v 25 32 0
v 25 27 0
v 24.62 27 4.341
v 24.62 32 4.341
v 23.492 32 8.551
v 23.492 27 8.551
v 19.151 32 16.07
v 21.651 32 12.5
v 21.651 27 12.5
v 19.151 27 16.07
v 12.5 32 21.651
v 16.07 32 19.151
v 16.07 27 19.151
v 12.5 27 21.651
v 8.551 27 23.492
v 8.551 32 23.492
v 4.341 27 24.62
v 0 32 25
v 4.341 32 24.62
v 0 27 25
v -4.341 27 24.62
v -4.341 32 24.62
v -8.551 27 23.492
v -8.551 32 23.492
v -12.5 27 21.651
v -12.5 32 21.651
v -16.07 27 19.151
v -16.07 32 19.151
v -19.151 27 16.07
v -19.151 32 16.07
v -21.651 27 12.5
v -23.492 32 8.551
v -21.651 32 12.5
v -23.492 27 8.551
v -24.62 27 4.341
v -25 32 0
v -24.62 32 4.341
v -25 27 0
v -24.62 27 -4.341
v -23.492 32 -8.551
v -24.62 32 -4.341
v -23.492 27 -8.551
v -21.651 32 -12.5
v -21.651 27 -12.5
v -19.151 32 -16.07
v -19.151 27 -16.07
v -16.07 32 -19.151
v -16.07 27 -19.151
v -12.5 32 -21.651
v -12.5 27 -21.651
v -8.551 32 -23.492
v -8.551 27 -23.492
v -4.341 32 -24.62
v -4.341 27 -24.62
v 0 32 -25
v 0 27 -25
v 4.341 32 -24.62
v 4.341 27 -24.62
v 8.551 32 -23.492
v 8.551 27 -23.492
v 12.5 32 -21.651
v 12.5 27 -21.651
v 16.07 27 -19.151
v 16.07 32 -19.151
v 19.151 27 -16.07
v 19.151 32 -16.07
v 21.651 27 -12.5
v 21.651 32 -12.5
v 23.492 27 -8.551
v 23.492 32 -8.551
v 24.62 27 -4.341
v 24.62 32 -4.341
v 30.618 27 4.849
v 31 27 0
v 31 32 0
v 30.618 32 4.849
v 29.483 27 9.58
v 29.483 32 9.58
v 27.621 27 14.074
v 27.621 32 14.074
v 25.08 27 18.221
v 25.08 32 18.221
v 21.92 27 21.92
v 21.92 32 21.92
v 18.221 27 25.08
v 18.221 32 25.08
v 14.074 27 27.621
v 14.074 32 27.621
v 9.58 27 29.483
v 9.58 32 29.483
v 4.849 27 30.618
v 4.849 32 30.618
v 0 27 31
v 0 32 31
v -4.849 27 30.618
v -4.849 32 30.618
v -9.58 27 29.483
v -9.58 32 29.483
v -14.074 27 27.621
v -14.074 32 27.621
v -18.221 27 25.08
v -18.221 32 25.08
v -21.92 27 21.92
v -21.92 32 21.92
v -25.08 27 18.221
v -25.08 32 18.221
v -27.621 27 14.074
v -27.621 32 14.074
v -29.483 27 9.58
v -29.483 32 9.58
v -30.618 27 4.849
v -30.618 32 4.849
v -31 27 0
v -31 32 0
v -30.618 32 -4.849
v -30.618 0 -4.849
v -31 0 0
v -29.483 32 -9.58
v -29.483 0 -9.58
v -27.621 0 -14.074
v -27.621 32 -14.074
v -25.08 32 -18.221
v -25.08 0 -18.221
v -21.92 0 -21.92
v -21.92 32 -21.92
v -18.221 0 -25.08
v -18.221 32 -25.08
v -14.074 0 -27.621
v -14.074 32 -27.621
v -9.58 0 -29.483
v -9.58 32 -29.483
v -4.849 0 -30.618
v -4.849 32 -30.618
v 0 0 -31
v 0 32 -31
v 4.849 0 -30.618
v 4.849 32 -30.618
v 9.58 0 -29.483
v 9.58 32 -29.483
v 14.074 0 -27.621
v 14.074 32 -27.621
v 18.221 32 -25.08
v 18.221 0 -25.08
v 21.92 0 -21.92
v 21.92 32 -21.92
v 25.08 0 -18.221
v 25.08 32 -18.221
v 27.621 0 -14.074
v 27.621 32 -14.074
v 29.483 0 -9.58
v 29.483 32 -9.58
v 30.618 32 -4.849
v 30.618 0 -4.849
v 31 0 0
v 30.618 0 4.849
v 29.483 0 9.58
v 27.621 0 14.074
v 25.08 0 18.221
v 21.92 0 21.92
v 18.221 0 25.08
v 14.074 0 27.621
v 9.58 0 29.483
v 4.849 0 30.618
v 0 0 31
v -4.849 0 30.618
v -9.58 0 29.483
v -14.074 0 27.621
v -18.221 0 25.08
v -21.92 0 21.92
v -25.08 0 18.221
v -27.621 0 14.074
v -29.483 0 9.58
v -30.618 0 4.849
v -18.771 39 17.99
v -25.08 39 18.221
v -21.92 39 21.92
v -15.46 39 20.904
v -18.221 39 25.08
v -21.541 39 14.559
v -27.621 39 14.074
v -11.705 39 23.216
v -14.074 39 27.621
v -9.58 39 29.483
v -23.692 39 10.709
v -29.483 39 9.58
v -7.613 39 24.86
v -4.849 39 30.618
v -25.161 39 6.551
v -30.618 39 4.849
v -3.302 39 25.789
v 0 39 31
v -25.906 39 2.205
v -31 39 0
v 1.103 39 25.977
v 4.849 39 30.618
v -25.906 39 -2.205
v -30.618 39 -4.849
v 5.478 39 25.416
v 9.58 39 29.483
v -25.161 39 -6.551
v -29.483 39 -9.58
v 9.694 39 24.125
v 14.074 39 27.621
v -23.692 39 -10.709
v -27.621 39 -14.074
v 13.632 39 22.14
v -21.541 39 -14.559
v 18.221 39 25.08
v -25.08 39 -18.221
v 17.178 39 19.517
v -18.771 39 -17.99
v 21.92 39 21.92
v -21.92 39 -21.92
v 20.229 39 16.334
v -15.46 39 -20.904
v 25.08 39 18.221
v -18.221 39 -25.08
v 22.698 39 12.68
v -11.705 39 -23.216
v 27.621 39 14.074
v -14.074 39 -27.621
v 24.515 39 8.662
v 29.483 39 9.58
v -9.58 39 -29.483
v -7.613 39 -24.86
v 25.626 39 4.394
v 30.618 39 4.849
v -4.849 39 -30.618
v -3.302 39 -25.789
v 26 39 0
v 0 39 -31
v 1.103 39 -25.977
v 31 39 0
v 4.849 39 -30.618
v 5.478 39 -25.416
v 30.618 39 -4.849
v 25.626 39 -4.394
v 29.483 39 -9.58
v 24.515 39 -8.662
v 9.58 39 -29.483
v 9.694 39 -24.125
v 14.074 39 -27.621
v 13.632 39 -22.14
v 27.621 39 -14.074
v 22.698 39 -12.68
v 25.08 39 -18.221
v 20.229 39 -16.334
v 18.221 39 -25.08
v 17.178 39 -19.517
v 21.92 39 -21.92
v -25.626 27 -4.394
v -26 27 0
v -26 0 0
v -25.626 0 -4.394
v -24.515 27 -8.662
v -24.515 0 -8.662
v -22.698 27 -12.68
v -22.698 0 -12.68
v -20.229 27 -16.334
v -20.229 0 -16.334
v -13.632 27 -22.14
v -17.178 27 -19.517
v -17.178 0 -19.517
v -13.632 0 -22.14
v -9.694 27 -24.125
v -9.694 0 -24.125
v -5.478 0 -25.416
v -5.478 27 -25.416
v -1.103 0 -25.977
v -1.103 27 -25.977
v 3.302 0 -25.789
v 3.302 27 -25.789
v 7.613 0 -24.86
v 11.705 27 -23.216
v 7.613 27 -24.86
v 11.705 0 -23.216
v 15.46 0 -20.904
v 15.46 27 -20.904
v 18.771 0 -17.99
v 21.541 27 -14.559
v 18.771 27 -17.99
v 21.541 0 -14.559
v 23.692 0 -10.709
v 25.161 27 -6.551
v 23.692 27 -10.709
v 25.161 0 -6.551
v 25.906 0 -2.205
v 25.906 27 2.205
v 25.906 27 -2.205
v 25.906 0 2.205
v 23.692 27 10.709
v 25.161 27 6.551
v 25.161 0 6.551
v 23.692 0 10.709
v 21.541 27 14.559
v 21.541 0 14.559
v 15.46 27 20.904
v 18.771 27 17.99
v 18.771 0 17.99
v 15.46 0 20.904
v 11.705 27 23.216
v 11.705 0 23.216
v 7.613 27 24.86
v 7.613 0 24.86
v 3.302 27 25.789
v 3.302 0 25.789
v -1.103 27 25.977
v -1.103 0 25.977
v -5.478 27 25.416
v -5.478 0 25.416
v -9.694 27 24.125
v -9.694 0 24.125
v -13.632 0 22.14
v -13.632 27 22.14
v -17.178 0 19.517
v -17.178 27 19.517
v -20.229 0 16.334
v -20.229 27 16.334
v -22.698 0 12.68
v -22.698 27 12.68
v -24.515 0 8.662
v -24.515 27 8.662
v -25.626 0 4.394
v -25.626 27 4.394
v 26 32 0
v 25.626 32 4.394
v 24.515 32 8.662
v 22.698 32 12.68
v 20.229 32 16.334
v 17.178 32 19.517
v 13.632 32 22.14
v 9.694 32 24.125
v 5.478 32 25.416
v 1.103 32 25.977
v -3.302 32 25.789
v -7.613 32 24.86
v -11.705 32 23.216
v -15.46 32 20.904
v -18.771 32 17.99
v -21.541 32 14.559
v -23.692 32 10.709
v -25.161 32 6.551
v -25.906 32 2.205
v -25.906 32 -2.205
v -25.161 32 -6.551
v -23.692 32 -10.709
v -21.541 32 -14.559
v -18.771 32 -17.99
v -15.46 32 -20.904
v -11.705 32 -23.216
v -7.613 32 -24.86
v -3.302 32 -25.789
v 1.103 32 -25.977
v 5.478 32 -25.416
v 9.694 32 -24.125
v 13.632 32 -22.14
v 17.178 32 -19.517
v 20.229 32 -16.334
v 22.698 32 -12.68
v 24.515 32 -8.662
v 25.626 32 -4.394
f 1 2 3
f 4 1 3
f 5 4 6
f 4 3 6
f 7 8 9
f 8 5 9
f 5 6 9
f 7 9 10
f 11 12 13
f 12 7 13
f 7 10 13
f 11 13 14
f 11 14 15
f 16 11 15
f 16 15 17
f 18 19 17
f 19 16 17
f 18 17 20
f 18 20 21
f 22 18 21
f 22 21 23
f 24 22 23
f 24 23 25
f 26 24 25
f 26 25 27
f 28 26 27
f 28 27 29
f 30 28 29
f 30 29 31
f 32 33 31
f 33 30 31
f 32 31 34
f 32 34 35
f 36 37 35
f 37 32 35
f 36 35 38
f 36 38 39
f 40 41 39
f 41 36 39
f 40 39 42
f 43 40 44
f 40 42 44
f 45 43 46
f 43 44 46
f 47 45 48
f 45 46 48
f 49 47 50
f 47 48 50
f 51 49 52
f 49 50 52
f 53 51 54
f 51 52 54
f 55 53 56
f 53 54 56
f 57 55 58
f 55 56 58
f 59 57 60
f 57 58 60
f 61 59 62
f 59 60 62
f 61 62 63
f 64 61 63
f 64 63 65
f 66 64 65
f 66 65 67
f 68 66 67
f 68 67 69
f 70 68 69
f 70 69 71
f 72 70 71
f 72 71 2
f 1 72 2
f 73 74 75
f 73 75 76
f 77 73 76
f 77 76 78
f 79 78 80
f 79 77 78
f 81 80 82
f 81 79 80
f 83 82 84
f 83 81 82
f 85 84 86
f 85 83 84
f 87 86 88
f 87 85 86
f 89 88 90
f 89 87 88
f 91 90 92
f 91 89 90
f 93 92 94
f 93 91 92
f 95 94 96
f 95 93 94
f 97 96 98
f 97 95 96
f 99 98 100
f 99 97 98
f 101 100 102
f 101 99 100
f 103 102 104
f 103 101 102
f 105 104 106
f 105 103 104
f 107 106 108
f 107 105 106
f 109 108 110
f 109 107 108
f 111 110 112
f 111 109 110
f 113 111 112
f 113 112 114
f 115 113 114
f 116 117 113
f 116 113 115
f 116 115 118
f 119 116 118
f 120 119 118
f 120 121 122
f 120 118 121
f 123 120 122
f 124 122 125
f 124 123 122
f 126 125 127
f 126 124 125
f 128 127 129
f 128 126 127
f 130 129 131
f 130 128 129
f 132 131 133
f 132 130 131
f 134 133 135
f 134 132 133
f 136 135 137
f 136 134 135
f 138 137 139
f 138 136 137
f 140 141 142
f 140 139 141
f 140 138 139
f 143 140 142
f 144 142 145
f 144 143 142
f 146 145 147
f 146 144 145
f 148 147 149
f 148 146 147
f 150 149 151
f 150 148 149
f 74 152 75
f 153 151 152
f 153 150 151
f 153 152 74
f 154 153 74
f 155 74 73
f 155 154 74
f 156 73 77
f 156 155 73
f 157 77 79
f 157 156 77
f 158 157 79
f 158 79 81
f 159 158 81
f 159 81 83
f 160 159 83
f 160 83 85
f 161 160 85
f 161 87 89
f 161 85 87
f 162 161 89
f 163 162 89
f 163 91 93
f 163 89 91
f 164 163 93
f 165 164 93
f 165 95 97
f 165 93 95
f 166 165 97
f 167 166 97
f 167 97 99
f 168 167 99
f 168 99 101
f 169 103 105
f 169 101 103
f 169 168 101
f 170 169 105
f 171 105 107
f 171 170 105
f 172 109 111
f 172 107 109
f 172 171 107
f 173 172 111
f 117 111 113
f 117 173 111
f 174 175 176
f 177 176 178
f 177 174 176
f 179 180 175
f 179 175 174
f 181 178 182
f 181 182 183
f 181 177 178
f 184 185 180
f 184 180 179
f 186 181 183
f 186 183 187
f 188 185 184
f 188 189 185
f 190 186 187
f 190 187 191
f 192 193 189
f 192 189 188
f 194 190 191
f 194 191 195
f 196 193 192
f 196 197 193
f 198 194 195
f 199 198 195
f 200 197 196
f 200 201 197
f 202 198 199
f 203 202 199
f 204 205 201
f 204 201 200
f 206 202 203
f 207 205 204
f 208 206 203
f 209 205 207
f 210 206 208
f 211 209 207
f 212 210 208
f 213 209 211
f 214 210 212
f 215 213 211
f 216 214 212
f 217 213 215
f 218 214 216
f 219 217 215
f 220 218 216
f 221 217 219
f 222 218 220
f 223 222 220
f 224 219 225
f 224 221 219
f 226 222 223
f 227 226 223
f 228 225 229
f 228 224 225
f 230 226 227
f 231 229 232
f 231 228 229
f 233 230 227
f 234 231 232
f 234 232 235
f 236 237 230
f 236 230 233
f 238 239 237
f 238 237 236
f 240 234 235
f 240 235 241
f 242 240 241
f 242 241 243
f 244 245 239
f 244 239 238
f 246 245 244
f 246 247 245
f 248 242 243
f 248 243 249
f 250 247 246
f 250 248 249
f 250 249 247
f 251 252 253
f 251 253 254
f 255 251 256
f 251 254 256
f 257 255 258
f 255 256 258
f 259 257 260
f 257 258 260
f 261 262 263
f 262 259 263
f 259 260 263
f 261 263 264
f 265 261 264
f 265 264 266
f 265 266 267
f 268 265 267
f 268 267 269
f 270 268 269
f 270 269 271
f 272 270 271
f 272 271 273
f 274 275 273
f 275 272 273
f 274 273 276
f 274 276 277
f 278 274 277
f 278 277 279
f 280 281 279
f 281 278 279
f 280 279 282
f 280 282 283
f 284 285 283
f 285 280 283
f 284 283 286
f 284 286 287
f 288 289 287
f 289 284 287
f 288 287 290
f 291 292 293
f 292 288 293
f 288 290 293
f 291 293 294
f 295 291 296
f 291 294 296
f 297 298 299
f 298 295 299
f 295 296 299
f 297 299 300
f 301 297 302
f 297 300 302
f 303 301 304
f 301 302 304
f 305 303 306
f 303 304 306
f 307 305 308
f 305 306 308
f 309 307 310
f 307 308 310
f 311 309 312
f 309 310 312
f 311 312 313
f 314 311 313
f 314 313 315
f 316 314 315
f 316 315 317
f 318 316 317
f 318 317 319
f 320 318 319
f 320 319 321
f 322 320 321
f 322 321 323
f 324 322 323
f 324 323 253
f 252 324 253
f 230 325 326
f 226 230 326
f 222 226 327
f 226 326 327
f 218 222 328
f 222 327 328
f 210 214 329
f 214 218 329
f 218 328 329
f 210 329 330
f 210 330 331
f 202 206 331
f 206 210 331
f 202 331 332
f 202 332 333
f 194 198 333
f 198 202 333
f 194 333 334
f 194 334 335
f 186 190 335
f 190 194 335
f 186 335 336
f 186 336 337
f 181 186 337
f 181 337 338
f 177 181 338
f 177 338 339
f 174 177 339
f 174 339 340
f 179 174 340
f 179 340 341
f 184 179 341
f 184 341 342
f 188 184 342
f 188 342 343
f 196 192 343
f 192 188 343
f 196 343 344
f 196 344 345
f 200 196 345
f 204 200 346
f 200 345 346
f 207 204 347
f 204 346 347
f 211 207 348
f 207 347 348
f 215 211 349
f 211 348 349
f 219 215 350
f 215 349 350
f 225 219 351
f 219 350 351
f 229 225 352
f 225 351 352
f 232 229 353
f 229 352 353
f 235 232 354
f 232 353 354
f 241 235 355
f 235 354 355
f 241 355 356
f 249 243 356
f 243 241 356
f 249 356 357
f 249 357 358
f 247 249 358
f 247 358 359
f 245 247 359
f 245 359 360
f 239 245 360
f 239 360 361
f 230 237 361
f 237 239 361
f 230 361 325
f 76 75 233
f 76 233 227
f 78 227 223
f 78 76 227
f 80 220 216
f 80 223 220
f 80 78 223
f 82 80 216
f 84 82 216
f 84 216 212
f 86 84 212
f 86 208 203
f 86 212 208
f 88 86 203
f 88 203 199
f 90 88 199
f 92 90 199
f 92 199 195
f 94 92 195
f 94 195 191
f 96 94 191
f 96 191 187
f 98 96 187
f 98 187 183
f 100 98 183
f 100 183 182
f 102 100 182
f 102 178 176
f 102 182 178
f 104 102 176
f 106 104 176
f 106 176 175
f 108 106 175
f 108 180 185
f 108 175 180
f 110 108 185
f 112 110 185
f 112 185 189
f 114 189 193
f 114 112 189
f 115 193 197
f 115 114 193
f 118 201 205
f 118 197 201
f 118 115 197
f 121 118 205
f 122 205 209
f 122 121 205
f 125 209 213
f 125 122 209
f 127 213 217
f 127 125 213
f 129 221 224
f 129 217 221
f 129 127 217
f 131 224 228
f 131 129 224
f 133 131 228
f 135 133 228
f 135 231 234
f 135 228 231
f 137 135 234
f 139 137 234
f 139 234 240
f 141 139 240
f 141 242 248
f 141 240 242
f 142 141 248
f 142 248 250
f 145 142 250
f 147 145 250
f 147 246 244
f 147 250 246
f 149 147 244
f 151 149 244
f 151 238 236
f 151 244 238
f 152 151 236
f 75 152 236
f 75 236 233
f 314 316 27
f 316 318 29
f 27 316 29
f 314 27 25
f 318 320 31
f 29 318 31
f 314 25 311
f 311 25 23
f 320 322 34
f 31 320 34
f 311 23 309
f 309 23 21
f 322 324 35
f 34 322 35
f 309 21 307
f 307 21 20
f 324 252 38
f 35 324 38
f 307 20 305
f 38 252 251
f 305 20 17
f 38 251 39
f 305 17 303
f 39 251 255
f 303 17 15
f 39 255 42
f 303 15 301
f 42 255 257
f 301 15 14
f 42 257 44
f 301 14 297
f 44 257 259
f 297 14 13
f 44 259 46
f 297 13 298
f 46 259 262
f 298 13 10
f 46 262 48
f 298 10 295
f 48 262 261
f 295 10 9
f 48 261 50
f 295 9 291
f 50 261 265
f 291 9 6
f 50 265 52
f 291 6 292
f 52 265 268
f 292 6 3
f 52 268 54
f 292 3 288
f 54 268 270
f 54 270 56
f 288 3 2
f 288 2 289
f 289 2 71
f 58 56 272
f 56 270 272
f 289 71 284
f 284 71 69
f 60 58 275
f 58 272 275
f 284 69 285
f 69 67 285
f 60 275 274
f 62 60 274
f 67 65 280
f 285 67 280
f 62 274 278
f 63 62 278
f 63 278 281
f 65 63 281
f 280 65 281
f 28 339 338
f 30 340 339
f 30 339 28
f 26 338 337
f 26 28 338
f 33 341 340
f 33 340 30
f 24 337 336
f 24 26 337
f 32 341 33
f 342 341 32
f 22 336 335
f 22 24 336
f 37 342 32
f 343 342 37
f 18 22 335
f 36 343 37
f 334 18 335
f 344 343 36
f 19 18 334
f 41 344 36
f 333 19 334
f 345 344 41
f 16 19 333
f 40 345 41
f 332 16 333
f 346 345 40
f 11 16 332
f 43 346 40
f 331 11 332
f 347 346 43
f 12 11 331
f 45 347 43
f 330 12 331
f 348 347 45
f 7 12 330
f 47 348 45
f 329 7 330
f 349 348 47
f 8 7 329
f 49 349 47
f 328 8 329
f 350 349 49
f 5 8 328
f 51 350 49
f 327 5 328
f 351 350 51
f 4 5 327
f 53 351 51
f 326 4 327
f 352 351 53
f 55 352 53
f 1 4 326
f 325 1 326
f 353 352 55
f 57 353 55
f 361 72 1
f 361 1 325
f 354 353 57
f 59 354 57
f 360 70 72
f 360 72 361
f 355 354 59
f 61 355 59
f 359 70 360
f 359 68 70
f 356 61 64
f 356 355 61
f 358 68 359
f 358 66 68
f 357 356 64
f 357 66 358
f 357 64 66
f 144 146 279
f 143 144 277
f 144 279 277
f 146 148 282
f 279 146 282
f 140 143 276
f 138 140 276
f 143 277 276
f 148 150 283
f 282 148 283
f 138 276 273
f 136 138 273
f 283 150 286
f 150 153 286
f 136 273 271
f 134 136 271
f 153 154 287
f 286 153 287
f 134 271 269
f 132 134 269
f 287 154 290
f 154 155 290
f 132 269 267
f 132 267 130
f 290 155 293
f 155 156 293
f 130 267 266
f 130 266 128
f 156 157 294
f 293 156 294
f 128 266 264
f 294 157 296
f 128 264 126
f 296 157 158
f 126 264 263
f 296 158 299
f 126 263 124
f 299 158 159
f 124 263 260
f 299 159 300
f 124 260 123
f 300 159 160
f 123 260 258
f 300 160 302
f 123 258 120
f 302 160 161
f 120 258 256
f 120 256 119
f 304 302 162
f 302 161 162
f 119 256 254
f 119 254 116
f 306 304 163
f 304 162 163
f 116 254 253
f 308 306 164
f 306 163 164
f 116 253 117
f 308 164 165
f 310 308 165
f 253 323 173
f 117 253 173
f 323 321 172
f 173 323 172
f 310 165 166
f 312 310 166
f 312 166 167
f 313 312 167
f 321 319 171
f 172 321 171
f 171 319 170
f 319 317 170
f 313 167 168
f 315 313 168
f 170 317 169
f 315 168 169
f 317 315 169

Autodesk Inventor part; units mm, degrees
ref_plane "YZ Plane" through (0, 0, 0) normal (1, 0, 0) x (0, 1, 0)
ref_plane "XZ Plane" through (0, 0, 0) normal (0, 1, 0) x (-1, 0, 0)
ref_plane "XY Plane" through (0, 0, 0) normal (0, 0, 1) x (1, 0, 0)
sketch "Sketch1" plane through (0, 0, 0) normal (0, 1, 0) x (-1, 0, 0)
  circle A0 centre (0, 0) radius 26
  circle A1 centre (0, 0) radius 31
  dimension "d0" = 52
  dimension "d1" = 62
extrude "Extrusion1" add sketch "Sketch1" along normal blind 27
sketch "Sketch2" plane through (0, 27, 0) normal (0, 1, 0) x (1, 0, 0)
  circle A0 centre (0, 0) radius 25
  circle A1 centre (0, 0) radius 31 projected
  dimension "d4" = 50
extrude "Extrusion2" add sketch "Sketch2" along normal blind 5
sketch "Sketch3" plane through (0, 32, 0) normal (0, 1, 0) x (1, 0, 0)
  circle A0 centre (0, 0) radius 31 projected
  circle A1 centre (0, 0) radius 26 projected
extrude "Extrusion3" add sketch "Sketch3" along normal blind 7
properties part number "Axis 4 Female Bearing Connector Bracket"
